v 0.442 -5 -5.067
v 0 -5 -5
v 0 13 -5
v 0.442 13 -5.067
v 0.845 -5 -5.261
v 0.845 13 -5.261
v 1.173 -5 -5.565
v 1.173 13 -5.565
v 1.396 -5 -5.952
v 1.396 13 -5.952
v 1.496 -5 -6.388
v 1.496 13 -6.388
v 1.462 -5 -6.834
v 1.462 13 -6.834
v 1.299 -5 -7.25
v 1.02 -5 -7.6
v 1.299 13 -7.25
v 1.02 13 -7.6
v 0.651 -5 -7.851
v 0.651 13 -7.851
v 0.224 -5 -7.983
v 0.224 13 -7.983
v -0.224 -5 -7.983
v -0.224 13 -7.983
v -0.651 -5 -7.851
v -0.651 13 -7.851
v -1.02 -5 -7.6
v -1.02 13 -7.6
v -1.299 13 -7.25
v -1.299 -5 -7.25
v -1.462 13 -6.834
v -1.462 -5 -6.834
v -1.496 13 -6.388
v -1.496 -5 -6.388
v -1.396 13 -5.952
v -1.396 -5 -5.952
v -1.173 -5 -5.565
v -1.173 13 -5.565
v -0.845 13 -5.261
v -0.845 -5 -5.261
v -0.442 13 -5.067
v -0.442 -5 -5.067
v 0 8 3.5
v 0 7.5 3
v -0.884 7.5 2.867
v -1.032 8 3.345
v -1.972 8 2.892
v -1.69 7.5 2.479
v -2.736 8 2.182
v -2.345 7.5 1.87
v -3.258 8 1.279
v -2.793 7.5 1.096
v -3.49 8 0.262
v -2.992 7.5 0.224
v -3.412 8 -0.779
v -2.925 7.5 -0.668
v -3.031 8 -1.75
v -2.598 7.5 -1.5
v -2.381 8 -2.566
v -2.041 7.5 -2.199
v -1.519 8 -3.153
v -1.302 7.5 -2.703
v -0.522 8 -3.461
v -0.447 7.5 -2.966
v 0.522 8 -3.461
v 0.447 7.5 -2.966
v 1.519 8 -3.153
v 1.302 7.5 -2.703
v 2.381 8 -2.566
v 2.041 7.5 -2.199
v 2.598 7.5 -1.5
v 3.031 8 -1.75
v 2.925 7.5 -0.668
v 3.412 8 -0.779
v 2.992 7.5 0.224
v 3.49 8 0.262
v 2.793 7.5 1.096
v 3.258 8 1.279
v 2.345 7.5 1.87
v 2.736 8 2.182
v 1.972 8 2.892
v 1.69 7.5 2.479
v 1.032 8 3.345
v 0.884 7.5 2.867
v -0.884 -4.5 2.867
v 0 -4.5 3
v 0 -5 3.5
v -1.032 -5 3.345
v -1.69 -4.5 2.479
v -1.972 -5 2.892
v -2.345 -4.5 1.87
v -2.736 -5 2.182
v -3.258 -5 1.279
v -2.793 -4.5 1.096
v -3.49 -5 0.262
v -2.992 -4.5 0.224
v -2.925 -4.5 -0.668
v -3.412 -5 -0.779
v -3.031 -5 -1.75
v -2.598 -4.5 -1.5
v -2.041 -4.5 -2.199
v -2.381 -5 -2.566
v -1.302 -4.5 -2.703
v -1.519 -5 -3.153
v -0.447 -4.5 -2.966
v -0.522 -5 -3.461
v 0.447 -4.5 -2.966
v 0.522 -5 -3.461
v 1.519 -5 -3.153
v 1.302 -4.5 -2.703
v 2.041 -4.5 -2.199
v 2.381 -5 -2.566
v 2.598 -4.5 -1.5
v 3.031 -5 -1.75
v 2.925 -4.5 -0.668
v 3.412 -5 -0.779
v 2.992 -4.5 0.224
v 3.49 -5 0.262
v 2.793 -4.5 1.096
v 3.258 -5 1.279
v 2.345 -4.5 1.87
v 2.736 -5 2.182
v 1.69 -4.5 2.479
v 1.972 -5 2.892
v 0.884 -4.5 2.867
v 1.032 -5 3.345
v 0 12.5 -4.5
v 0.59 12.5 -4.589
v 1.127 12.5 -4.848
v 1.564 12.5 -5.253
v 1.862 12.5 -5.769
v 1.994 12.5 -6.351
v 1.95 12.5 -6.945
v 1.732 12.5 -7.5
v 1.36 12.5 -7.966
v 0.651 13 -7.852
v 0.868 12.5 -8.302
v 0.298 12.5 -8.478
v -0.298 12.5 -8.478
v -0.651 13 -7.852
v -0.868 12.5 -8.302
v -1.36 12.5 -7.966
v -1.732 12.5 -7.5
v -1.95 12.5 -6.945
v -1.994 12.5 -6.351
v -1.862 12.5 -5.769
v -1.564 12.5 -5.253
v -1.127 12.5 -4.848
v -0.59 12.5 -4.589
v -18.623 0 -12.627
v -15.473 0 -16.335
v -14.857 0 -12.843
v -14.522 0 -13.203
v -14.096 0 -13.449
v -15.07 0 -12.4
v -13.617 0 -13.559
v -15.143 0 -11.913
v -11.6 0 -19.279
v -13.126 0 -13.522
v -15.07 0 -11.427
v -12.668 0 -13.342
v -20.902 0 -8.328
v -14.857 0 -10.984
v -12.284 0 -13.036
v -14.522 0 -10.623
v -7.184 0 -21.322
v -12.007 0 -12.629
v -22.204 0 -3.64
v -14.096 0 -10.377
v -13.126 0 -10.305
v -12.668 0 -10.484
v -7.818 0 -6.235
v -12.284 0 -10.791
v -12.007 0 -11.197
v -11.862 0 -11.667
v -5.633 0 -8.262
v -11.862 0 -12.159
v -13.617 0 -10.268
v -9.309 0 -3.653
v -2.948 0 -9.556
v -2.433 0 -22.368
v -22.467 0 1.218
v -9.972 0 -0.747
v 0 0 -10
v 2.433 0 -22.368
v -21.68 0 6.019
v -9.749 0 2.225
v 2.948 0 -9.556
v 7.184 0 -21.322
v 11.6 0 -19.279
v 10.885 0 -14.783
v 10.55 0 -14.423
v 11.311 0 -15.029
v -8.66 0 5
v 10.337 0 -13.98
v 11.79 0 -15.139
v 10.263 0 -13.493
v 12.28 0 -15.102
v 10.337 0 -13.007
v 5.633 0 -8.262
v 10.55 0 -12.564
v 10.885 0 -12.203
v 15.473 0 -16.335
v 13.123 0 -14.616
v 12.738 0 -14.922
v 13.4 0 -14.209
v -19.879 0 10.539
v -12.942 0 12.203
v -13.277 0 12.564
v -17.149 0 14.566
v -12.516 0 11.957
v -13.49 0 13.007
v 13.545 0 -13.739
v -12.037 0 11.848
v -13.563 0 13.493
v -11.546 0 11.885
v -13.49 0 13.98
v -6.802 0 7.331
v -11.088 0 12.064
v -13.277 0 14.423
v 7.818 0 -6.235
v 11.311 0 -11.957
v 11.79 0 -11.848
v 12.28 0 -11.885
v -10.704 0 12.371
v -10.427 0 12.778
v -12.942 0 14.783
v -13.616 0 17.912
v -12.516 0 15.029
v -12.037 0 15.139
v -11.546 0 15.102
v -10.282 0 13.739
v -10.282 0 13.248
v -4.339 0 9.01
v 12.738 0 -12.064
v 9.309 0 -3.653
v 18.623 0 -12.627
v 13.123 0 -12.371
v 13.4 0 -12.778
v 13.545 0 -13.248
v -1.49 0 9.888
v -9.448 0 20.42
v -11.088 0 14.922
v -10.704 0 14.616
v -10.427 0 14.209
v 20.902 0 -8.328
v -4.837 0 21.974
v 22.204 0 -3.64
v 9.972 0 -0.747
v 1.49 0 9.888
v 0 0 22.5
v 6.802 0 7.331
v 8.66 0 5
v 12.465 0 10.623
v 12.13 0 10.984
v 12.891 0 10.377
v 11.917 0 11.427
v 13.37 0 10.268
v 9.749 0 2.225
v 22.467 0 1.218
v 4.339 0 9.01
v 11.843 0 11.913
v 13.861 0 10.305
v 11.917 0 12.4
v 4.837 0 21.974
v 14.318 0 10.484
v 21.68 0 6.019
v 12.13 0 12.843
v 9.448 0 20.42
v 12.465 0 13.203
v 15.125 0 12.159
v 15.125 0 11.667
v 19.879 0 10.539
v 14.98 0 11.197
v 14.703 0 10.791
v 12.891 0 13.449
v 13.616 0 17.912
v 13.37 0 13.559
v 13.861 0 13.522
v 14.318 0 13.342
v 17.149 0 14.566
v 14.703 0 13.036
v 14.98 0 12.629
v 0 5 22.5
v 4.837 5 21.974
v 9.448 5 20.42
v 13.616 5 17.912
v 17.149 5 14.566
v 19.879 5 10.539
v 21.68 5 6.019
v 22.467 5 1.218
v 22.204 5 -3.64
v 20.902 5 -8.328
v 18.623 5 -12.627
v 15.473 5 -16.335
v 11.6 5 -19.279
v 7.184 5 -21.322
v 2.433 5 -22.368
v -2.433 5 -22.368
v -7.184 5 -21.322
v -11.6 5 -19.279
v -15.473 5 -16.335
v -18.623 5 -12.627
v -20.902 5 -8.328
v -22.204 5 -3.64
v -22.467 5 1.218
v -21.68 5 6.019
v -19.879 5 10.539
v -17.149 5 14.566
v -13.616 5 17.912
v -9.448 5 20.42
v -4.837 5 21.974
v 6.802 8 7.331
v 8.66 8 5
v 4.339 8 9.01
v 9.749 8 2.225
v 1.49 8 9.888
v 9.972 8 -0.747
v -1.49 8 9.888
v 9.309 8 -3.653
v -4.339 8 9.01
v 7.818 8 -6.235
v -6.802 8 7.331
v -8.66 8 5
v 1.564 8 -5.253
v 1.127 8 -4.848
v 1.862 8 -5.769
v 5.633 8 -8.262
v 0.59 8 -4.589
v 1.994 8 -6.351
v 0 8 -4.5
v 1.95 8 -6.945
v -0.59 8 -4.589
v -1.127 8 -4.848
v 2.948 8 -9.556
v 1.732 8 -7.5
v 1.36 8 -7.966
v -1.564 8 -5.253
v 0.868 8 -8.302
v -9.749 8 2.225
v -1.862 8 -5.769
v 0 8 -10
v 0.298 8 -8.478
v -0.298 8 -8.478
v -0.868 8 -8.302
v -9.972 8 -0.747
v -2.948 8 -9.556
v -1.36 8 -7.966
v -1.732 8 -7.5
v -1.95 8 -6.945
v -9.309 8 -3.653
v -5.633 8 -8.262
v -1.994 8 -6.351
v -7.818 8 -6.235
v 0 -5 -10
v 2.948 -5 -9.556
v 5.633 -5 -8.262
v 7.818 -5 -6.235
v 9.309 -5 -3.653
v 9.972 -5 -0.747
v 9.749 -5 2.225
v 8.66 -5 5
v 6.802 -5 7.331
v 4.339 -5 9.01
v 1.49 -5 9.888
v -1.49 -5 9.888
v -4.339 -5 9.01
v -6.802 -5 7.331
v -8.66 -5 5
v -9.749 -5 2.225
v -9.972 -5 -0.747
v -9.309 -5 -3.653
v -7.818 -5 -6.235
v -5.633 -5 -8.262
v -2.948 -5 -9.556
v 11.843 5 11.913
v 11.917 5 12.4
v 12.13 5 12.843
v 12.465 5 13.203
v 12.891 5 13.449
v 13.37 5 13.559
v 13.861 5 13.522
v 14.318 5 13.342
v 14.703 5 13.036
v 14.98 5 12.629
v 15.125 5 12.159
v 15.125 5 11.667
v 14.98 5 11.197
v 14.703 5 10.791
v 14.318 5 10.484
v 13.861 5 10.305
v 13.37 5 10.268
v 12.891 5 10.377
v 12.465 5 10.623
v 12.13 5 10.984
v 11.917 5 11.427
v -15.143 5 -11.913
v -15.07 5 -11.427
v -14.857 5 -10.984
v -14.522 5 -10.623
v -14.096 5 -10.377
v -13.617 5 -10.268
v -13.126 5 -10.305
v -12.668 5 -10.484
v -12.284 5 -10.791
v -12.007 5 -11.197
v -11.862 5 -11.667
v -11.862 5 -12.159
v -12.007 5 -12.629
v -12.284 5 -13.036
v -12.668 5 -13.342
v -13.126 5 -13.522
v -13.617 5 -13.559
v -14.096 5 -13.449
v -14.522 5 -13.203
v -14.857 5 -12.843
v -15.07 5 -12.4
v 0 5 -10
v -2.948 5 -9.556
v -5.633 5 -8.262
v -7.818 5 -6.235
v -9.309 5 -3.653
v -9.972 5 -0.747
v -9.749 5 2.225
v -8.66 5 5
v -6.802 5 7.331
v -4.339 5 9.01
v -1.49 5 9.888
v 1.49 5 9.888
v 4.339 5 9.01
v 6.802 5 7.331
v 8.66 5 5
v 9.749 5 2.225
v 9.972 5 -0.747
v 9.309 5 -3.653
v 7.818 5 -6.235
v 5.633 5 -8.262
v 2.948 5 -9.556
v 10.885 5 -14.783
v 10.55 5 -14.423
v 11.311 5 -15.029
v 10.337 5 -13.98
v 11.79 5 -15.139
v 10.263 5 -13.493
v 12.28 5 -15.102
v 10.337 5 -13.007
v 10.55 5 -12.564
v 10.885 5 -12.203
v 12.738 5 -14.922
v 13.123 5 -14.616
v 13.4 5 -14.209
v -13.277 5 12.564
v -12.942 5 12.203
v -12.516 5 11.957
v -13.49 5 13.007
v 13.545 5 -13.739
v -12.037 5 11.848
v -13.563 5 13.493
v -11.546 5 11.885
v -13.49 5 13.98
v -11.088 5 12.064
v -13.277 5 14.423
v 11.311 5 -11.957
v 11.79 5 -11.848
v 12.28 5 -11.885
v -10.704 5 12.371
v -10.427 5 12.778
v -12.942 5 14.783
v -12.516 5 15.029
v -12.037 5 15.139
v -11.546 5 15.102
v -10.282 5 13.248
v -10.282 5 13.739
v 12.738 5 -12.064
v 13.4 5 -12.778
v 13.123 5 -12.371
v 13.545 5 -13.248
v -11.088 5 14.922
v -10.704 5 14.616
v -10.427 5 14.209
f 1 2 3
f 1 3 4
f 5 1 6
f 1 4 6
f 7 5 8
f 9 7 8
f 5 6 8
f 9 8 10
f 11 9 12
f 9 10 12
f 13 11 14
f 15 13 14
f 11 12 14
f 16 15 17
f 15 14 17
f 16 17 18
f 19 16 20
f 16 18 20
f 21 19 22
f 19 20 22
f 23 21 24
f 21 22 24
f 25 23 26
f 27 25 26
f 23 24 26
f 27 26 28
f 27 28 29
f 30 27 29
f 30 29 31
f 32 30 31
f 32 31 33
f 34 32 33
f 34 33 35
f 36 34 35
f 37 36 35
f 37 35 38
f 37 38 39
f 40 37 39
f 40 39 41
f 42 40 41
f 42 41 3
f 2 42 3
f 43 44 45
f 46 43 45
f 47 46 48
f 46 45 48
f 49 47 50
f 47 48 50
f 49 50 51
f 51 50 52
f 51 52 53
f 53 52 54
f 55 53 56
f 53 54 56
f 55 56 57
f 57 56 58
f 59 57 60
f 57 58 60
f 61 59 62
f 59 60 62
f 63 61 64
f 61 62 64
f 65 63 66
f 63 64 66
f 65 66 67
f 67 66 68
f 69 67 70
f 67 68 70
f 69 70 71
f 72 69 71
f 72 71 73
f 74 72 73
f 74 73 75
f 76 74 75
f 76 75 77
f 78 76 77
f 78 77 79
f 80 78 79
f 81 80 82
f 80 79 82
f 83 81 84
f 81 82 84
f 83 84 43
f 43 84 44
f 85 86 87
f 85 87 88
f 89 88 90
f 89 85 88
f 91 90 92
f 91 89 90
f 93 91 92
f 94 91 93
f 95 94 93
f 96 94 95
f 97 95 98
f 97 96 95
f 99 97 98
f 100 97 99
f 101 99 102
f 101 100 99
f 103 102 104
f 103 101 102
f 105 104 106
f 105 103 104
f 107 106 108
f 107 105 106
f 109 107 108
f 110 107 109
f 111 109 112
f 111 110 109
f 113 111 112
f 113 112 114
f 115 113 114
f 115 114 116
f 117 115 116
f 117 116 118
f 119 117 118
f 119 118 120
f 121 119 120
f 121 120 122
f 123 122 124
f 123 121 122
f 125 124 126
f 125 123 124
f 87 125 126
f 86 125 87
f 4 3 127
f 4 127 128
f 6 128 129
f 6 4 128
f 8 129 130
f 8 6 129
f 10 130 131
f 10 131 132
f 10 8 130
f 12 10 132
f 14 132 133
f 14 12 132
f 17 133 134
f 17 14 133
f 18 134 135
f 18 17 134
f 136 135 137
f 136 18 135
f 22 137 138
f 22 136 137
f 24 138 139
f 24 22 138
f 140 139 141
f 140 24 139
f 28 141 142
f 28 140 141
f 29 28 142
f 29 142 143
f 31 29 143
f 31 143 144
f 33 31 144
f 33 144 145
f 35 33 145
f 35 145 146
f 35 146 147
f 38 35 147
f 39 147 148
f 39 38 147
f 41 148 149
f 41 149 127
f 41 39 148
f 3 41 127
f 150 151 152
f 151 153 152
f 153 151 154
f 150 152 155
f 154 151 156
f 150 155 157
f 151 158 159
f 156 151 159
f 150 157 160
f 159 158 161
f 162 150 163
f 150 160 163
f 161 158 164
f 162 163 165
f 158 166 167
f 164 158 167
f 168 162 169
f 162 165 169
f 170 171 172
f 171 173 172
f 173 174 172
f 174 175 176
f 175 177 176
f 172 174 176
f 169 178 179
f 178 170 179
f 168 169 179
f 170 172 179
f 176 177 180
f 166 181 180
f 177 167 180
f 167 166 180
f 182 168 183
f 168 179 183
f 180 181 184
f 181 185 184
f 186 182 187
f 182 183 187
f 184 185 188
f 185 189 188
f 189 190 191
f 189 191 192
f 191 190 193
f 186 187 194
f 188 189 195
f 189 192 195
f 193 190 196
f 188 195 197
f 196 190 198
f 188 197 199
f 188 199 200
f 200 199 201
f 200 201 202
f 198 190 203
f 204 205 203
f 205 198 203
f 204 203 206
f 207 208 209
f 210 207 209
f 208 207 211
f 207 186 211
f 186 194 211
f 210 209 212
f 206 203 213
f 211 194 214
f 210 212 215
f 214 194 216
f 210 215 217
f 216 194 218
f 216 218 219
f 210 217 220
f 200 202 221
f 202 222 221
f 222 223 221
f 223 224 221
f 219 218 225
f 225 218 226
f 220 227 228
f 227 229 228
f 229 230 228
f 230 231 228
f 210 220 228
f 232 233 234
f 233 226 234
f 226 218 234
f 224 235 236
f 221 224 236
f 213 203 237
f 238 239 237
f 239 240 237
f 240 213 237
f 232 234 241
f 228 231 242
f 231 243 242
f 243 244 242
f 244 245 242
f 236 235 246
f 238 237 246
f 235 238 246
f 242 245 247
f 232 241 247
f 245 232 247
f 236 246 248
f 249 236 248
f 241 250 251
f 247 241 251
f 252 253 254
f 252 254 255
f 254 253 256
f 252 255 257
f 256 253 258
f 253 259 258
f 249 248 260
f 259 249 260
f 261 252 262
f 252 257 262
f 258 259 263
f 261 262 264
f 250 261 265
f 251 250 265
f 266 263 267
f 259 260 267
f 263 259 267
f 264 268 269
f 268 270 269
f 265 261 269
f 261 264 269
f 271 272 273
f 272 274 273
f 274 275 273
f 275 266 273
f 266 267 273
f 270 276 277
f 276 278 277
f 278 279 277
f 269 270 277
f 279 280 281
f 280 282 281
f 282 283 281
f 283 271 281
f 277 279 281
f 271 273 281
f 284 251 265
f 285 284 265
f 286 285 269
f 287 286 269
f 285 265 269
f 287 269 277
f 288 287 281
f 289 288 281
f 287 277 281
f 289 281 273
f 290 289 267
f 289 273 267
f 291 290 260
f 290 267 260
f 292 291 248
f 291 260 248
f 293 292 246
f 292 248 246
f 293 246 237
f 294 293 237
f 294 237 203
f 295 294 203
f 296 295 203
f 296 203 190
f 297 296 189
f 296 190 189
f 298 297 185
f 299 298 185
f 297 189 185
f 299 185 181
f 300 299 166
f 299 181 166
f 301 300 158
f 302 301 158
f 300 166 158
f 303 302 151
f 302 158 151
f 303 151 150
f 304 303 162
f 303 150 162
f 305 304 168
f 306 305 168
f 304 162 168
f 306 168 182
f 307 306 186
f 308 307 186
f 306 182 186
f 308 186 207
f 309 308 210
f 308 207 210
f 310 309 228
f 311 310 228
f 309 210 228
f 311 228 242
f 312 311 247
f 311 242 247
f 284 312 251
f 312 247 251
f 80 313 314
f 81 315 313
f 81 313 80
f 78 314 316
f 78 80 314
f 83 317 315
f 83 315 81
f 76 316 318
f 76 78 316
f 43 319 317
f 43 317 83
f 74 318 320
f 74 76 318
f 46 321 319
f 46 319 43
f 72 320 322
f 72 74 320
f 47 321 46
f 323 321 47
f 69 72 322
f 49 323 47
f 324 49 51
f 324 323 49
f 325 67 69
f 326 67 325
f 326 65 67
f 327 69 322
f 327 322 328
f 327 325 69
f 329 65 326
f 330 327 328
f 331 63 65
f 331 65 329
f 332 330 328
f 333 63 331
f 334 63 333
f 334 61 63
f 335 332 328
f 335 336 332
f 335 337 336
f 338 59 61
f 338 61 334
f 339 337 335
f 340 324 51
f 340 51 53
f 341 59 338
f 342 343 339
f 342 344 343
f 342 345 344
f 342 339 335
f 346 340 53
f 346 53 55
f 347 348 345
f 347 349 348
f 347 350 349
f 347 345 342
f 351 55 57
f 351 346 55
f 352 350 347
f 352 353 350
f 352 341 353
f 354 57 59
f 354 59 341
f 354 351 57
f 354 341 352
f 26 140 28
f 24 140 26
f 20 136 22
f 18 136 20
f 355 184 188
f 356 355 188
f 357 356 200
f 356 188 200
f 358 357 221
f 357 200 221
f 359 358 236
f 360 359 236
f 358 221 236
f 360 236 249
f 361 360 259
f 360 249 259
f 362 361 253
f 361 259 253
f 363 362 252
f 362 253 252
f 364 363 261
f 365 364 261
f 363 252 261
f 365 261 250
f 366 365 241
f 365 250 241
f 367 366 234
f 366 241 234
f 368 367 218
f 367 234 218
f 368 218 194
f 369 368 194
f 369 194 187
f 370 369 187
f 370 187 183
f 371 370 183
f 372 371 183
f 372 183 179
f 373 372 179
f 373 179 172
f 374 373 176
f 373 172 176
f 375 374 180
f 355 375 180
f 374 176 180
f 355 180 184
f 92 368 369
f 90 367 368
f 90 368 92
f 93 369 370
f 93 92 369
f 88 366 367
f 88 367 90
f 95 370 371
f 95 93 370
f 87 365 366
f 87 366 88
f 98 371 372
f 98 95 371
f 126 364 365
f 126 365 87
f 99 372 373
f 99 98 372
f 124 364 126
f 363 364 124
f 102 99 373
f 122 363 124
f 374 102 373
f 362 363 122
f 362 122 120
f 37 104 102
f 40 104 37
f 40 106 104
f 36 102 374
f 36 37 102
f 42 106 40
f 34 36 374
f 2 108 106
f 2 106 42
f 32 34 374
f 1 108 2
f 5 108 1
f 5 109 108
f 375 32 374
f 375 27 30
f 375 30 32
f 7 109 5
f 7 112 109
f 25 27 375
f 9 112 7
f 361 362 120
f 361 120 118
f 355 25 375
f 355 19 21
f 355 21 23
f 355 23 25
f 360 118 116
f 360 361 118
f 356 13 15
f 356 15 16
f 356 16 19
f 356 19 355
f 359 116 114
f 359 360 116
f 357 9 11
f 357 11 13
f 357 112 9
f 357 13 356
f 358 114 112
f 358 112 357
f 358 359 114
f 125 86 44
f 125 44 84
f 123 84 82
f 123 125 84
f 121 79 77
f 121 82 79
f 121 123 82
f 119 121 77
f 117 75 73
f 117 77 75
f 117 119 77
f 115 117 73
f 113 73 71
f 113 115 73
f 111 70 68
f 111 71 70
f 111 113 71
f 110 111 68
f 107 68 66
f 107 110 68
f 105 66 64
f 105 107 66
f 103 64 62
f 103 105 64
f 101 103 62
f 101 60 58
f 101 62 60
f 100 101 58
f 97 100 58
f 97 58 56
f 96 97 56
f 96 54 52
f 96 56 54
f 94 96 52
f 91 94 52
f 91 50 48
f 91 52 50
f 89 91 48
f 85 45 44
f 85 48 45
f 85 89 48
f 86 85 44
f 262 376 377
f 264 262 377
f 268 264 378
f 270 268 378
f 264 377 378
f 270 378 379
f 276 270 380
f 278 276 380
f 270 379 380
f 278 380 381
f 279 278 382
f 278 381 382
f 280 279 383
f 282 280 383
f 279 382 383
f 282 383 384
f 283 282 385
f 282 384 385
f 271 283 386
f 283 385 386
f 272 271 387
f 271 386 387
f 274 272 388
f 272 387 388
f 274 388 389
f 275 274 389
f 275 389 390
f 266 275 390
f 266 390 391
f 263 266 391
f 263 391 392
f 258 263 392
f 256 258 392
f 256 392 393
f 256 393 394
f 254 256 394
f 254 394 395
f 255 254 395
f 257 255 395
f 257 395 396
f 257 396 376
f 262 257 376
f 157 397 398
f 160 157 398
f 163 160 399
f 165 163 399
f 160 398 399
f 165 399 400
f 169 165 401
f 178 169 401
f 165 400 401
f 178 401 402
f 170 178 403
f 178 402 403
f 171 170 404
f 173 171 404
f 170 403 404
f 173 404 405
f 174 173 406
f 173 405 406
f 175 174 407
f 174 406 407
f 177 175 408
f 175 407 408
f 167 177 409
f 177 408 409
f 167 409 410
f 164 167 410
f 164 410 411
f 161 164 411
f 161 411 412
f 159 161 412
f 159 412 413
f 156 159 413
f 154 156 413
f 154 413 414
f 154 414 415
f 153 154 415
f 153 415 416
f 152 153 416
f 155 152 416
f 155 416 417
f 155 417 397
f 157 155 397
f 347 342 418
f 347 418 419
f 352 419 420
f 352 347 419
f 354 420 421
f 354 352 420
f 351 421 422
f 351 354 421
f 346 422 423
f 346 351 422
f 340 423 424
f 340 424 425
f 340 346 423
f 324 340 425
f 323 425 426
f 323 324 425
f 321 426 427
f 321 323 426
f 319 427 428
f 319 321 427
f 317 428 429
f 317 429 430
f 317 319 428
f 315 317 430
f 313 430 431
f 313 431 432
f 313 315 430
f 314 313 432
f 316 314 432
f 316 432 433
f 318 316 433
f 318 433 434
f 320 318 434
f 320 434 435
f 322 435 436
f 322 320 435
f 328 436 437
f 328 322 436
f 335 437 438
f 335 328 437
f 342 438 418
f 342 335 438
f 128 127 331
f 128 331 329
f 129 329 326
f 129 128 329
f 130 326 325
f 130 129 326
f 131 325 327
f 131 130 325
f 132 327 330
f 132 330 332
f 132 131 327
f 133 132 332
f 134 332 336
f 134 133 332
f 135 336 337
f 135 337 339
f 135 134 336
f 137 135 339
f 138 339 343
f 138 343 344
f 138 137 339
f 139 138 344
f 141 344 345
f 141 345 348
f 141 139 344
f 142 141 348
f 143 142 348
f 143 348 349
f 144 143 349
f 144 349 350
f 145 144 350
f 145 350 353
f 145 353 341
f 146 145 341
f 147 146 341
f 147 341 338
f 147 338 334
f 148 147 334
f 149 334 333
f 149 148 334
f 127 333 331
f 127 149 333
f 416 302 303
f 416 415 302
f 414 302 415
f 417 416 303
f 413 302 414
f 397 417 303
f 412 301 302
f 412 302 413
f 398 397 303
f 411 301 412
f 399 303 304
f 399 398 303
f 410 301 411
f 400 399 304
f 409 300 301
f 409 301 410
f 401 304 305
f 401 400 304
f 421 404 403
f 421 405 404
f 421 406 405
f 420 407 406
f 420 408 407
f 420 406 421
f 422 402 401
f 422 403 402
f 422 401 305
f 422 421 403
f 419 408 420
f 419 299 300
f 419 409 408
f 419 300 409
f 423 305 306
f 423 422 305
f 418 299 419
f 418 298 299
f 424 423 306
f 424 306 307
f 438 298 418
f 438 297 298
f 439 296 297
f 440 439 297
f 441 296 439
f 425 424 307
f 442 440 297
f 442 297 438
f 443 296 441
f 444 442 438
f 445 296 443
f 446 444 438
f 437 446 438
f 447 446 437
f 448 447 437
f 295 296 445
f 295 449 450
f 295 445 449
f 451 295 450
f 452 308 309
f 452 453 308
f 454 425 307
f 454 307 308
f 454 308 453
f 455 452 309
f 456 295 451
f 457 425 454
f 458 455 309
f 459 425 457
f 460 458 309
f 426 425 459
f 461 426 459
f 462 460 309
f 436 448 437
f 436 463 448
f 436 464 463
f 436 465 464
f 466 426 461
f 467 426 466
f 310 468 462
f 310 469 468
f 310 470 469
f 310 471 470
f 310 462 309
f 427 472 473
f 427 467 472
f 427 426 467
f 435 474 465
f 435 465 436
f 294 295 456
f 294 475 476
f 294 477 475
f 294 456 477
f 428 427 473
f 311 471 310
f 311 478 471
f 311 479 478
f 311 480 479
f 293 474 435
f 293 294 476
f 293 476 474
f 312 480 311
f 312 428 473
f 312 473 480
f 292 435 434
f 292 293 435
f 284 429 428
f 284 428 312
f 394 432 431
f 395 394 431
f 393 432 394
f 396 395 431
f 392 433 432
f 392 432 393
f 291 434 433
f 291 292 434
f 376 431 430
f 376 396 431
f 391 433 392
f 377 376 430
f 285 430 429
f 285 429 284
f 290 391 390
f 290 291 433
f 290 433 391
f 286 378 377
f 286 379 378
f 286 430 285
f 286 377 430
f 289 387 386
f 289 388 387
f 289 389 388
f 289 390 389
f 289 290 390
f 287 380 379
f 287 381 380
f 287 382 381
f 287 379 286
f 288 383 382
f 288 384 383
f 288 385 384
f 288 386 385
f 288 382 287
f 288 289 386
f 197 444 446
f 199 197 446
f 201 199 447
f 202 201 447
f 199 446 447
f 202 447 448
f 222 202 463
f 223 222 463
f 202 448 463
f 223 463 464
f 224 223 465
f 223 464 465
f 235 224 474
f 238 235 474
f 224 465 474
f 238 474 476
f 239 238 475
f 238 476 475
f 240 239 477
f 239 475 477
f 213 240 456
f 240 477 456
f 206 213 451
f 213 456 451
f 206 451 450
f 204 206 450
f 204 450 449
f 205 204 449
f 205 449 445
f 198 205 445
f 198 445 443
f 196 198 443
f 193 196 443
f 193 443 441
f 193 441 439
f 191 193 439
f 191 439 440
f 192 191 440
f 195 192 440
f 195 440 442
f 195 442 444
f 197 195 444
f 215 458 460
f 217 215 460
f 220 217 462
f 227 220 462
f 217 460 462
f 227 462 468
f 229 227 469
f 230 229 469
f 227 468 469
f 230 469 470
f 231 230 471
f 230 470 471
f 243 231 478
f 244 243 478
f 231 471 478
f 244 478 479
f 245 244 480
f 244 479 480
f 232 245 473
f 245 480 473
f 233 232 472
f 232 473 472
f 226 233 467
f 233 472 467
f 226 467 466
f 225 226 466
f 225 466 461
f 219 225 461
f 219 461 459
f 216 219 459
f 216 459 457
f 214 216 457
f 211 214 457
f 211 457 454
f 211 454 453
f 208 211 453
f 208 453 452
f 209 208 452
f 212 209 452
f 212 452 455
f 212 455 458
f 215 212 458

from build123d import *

# Parameters (mm, degrees)
SKETCH_1_R               = 22.5
EXTRUDE_1_DEPTH          = 5
SKETCH_2_R               = 10
EXTRUDE_2_DEPTH          = 5
EXTRUDE_START            = 3
SKETCH_4_R               = 10
EXTRUDE_3_DEPTH          = 3
CUT_EXTRUDE_2_DEPTH      = 35.372954485
CUT_EXTRUDE_2_DEPTH_BACK = 35.372954485
SKETCH_5_R               = 3
HOLE_WIZARD_M4_3_D       = 3.3
SKETCH_10_R              = 1.5
CUT_EXTRUDE_3_DEPTH      = 35.372954485
CHAMFER_2_SIZE           = 0.5
EXTRUDE_START_2          = 5
SKETCH_11_R              = 2
SKETCH_11_R_2            = 1.5
EXTRUDE_4_DEPTH          = 5
CHAMFER_3_SIZE           = 0.5


with BuildPart() as part:
    # 草图1 → 凸台-拉伸1 (new body)
    with BuildSketch(Plane(origin=(0, 0, 0), x_dir=(1, 0, 0), z_dir=(0, 1, 0))):
        with Locations(Location((0, 0, 0), (0, 0, 270))):
            Circle(SKETCH_1_R)
    extrude(amount=EXTRUDE_1_DEPTH)

    # 草图2 → 凸台-拉伸2 (add)
    with BuildSketch(Plane.XZ):
        with Locations(Location((0, 0, 0), (0, 0, 270))):
            Circle(SKETCH_2_R)
    extrude(amount=EXTRUDE_2_DEPTH)

    # 草图4 → 凸台-拉伸3 (add)
    with BuildSketch(Plane(origin=(0, 5, 0), x_dir=(1, 0, 0), z_dir=(0, 1, 0)).offset(EXTRUDE_START)):
        with Locations(Location((0, 0, 0), (0, 0, 90))):
            Circle(SKETCH_4_R)
    extrude(amount=-EXTRUDE_3_DEPTH)

    # 草图5 → 切除-拉伸2 (cut, two sides: drawn at the far end of the back side and taken through both)
    with BuildSketch(Plane(origin=(0, 8, 0), x_dir=(1, 0, 0), z_dir=(0, 1, 0)).offset(-CUT_EXTRUDE_2_DEPTH_BACK)):
        with Locations(Location((0, 0, 0), (0, 0, 270))):
            Circle(SKETCH_5_R)
    extrude(amount=CUT_EXTRUDE_2_DEPTH + CUT_EXTRUDE_2_DEPTH_BACK, mode=Mode.SUBTRACT)

    # M4 螺纹孔3 (through all)
    with Locations(Plane.XZ):
        with Locations((11.913336036, -13.493421527), (13.493421527, 11.913336036), (-11.913336036, 13.493421527), (-13.493421527, -11.913336036)):
            Hole(HOLE_WIZARD_M4_3_D / 2)

    # 草图10 → 切除-拉伸3 (cut, through all)
    with BuildSketch(Plane(origin=(0, 8, 0), x_dir=(1, 0, 0), z_dir=(0, 1, 0))):
        with Locations(Location((0, 6.5, 0), (0, 0, 270))):
            Circle(SKETCH_10_R)
    extrude(amount=-CUT_EXTRUDE_3_DEPTH, mode=Mode.SUBTRACT)

    # 倒角2
    chamfer_2_edges = [part.edges().sort_by_distance(p)[0] for p in [
        (0, 8, -3),
        (0, -5, -3),
    ]]
    chamfer(chamfer_2_edges, length=CHAMFER_2_SIZE)

    # 草图11 → 凸台-拉伸4 (add)
    with BuildSketch(Plane(origin=(0, 8, 0), x_dir=(1, 0, 0), z_dir=(0, 1, 0)).offset(EXTRUDE_START_2)):
        with Locations(Location((0, 6.5, 0), (0, 0, 270))):
            Circle(SKETCH_11_R)
        with Locations(Location((0, 6.5, 0), (0, 0, 270))):
            Circle(SKETCH_11_R_2, mode=Mode.SUBTRACT)
    extrude(amount=-EXTRUDE_4_DEPTH)

    # 倒角3
    chamfer_3_edges = [part.edges().sort_by_distance(p)[0] for p in [
        (0, 13, -8.5),
    ]]
    chamfer(chamfer_3_edges, length=CHAMFER_3_SIZE - 0.0001)  # a hair under: the kernel refuses the full size


solid = part.part
